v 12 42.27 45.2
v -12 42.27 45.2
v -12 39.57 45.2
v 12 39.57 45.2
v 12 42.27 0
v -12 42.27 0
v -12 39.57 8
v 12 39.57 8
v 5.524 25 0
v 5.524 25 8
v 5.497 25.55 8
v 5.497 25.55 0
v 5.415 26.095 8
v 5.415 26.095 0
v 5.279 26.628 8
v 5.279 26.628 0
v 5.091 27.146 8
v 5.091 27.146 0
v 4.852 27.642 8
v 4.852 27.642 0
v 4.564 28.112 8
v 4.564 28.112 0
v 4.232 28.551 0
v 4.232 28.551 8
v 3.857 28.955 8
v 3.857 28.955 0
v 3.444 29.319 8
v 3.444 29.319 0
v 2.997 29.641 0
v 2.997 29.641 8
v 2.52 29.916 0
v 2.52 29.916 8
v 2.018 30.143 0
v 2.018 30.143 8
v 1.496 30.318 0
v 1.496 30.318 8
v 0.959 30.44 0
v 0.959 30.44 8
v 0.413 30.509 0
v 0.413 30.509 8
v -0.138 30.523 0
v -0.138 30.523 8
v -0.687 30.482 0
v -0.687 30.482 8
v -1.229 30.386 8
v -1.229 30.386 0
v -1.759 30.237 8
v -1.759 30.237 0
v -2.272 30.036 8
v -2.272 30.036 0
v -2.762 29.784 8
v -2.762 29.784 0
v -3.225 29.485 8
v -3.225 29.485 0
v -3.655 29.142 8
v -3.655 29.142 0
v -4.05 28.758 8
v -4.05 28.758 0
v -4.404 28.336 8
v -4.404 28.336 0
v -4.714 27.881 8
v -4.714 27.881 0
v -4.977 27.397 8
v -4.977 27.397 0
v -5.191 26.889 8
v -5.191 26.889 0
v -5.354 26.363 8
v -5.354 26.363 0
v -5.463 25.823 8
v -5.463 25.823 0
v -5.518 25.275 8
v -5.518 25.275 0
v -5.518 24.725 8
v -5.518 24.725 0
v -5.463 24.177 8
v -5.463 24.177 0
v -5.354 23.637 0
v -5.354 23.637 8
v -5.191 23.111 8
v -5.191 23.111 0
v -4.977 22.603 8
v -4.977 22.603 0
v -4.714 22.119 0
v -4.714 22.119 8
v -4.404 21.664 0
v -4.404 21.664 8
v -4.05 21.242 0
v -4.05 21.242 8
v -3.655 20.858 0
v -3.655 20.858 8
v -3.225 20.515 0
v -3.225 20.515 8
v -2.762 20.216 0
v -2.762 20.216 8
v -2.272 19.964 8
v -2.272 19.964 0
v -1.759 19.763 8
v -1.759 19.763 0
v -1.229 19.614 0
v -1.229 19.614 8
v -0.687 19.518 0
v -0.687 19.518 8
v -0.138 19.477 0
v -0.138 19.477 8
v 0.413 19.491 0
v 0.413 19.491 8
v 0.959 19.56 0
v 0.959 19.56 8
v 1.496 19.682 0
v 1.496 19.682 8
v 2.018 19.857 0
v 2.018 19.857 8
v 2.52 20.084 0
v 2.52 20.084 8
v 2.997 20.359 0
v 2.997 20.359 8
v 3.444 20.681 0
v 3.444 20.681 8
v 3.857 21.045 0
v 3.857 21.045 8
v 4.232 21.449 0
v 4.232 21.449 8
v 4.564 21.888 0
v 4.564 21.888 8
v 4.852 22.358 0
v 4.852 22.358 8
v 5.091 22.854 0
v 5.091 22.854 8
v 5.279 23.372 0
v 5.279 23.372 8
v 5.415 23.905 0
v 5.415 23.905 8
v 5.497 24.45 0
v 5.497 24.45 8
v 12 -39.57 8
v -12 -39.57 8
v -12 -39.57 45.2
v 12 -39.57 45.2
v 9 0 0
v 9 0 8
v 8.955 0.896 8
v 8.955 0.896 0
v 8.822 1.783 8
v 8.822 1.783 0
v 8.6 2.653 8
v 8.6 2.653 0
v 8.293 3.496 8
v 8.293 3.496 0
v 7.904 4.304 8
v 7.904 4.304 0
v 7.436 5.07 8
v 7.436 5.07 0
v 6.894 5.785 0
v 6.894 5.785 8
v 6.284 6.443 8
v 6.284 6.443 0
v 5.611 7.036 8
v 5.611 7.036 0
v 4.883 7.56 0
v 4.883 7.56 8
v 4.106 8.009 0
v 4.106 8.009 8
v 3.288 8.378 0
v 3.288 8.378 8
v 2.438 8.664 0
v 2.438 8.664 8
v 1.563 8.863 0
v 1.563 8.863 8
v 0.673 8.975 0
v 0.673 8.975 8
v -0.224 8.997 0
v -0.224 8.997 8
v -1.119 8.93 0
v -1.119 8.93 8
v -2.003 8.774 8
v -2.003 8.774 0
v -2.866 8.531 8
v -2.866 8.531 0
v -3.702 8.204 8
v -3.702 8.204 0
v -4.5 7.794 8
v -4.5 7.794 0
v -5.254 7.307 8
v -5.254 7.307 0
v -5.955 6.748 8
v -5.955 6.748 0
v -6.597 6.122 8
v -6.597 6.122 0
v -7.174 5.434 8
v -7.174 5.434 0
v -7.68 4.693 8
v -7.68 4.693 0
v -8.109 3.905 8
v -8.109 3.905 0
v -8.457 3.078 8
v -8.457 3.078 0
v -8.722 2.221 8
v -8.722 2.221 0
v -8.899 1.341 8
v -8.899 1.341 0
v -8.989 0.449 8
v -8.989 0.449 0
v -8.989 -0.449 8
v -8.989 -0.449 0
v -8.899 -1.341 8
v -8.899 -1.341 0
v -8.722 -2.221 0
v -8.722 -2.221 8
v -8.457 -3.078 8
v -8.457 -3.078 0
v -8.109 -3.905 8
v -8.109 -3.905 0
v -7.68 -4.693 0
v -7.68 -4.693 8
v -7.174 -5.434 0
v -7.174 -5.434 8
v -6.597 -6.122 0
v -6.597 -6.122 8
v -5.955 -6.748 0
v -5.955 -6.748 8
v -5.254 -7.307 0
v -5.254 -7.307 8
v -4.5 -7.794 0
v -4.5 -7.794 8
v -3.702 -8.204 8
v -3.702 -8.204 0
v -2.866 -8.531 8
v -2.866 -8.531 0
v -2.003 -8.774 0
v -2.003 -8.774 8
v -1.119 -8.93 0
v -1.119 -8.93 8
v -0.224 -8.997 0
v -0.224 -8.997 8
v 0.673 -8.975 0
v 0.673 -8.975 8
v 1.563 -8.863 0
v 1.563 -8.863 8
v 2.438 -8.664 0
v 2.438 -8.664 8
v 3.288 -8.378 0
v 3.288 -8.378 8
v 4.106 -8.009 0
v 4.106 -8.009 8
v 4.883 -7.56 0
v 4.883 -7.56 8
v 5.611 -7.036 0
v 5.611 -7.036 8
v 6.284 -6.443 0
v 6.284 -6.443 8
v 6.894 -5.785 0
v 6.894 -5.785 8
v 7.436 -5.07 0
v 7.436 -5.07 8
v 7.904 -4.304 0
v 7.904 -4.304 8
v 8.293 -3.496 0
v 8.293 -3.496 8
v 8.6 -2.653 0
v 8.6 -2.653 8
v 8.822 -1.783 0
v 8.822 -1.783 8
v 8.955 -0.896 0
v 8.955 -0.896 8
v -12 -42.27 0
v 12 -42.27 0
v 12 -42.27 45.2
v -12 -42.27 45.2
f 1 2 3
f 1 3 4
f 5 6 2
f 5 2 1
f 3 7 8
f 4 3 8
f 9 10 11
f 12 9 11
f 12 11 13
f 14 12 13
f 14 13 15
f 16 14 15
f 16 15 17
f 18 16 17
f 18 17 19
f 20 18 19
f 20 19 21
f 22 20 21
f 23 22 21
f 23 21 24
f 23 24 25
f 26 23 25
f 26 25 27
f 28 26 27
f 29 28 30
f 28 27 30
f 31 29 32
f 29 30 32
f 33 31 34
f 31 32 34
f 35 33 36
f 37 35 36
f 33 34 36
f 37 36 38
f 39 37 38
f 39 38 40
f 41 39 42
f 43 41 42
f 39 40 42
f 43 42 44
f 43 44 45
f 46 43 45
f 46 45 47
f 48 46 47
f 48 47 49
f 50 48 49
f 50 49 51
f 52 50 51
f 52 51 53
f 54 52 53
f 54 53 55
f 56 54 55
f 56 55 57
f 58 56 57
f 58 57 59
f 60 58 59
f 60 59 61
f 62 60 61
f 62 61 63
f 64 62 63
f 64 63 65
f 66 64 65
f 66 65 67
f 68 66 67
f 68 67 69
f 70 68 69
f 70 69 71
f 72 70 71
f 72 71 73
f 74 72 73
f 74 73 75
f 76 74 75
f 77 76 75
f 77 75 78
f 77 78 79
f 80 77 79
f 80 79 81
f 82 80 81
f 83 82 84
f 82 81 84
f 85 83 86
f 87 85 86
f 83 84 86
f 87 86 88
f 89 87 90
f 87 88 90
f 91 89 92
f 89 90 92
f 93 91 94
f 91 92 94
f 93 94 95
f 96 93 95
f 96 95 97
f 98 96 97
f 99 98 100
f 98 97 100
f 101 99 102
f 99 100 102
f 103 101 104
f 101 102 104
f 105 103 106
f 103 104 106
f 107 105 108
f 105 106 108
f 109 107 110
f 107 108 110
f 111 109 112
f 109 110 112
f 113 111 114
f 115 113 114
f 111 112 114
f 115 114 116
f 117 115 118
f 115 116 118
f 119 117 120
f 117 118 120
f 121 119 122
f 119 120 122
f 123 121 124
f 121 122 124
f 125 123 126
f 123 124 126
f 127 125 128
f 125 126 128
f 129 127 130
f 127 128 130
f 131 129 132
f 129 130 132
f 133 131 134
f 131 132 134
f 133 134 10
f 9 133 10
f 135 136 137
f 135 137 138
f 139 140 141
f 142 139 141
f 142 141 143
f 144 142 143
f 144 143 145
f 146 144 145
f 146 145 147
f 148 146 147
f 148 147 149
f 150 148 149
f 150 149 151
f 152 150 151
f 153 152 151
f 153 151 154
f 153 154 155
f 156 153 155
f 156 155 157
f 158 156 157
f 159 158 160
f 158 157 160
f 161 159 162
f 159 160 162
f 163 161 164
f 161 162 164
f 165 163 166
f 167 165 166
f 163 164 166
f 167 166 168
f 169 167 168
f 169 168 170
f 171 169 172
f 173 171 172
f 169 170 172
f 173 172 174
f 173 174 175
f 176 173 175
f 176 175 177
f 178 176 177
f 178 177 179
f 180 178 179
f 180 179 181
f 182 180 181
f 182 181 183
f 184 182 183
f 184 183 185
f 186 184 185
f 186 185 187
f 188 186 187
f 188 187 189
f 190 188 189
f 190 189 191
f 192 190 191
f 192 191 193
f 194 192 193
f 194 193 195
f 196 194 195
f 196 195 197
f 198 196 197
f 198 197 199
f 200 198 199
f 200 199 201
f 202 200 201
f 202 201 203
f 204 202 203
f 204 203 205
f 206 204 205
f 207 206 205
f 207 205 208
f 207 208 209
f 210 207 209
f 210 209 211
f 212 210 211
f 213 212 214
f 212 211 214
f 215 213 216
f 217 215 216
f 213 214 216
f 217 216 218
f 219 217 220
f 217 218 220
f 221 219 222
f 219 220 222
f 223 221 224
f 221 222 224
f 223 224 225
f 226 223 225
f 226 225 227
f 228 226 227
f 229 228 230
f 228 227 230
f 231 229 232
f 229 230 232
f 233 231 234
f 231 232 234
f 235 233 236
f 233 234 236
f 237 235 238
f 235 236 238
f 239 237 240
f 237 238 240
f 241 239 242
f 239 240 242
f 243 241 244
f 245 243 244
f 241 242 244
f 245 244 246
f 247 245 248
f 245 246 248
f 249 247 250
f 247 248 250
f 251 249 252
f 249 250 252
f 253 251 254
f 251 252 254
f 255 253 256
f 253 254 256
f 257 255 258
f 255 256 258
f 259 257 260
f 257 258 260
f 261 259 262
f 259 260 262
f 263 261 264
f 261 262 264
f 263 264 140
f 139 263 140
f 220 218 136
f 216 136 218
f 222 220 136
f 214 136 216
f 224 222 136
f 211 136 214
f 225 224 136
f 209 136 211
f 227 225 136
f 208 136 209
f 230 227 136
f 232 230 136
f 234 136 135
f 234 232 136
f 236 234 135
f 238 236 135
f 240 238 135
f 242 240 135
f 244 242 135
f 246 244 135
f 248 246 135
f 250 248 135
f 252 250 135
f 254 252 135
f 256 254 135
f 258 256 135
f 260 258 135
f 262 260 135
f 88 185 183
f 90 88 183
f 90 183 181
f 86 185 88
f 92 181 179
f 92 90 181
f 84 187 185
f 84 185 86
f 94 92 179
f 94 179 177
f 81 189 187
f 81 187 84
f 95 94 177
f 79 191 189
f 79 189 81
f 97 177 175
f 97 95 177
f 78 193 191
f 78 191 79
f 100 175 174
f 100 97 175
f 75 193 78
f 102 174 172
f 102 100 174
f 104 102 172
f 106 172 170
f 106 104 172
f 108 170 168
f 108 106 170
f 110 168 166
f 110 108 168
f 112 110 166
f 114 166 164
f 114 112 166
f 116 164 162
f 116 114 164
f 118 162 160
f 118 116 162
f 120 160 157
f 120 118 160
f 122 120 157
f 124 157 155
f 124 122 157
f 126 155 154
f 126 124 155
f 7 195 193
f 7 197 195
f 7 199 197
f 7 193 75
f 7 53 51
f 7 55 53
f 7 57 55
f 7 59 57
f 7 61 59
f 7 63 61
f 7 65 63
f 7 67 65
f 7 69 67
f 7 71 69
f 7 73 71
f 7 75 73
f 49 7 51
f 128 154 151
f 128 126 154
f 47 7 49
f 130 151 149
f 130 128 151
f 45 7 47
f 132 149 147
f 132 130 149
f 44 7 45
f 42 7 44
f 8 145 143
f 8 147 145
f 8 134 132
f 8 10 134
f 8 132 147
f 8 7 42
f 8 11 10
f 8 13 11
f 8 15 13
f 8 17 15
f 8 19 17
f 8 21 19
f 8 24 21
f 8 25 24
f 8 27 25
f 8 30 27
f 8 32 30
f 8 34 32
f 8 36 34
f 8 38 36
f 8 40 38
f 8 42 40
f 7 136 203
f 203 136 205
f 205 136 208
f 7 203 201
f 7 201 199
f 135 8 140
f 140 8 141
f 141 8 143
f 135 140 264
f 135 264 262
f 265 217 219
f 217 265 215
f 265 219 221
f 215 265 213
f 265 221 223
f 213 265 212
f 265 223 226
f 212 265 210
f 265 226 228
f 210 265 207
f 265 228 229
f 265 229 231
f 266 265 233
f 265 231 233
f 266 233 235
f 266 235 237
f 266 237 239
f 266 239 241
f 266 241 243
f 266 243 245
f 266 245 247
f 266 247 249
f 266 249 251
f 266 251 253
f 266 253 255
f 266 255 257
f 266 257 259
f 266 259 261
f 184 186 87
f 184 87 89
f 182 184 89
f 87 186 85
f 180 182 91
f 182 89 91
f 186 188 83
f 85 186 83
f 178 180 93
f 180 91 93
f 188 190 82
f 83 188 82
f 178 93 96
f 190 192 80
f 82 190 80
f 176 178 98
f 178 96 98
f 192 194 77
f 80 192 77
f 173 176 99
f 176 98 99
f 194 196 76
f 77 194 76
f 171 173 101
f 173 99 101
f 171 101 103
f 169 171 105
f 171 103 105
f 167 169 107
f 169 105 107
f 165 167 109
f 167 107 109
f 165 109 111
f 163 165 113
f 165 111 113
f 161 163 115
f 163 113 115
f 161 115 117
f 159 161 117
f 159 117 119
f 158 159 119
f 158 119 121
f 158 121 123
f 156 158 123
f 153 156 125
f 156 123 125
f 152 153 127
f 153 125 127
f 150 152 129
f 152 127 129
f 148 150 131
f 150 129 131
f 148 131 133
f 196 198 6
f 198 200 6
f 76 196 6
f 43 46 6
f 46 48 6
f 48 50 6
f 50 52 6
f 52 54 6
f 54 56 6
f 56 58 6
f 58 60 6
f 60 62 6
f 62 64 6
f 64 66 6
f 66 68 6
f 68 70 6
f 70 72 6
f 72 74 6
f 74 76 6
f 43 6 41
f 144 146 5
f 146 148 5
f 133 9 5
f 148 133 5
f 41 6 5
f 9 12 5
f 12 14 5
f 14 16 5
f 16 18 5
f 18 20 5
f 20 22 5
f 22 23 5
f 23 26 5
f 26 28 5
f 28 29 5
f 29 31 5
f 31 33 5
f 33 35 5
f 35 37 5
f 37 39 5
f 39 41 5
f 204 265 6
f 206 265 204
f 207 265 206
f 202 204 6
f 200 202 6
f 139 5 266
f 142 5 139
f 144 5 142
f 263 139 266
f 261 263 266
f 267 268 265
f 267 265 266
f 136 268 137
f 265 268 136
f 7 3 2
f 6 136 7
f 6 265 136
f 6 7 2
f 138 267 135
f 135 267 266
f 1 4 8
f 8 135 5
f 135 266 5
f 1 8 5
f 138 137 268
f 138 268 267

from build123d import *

# Parameters (mm, degrees)
F0_W     = 24
F0_H     = 84.54
F1_DEPTH = 8
F2_W     = 24
F2_H     = 2.7
F3_DEPTH = 37.2
F4_R     = 9
F5_DEPTH = 8.001
F6_R     = 5.524405
F7_DEPTH = 8.001


with BuildPart() as f1:
    # F0 (on Top) → F1 (new body)
    with BuildSketch(Plane.XY):
        Rectangle(F0_W, F0_H)
    extrude(amount=F1_DEPTH)

    # F2 (on face) → F3 (join)
    with BuildSketch(Plane.XY.offset(8)):
        with Locations((0, 40.92)):
            Rectangle(F2_W, F2_H)
        with Locations((0, -40.92)):
            Rectangle(F2_W, F2_H)
    extrude(amount=F3_DEPTH)

    # F4 (on face) → F5 (cut, through all)
    with BuildSketch(Plane.XY.offset(8)):
        Circle(F4_R)
    extrude(amount=-F5_DEPTH, mode=Mode.SUBTRACT)

    # F6 (on face) → F7 (cut, through all)
    with BuildSketch(Plane.XY.offset(8)):
        with Locations((0, 25)):
            Circle(F6_R)
    extrude(amount=-F7_DEPTH, mode=Mode.SUBTRACT)


solid = f1.part
